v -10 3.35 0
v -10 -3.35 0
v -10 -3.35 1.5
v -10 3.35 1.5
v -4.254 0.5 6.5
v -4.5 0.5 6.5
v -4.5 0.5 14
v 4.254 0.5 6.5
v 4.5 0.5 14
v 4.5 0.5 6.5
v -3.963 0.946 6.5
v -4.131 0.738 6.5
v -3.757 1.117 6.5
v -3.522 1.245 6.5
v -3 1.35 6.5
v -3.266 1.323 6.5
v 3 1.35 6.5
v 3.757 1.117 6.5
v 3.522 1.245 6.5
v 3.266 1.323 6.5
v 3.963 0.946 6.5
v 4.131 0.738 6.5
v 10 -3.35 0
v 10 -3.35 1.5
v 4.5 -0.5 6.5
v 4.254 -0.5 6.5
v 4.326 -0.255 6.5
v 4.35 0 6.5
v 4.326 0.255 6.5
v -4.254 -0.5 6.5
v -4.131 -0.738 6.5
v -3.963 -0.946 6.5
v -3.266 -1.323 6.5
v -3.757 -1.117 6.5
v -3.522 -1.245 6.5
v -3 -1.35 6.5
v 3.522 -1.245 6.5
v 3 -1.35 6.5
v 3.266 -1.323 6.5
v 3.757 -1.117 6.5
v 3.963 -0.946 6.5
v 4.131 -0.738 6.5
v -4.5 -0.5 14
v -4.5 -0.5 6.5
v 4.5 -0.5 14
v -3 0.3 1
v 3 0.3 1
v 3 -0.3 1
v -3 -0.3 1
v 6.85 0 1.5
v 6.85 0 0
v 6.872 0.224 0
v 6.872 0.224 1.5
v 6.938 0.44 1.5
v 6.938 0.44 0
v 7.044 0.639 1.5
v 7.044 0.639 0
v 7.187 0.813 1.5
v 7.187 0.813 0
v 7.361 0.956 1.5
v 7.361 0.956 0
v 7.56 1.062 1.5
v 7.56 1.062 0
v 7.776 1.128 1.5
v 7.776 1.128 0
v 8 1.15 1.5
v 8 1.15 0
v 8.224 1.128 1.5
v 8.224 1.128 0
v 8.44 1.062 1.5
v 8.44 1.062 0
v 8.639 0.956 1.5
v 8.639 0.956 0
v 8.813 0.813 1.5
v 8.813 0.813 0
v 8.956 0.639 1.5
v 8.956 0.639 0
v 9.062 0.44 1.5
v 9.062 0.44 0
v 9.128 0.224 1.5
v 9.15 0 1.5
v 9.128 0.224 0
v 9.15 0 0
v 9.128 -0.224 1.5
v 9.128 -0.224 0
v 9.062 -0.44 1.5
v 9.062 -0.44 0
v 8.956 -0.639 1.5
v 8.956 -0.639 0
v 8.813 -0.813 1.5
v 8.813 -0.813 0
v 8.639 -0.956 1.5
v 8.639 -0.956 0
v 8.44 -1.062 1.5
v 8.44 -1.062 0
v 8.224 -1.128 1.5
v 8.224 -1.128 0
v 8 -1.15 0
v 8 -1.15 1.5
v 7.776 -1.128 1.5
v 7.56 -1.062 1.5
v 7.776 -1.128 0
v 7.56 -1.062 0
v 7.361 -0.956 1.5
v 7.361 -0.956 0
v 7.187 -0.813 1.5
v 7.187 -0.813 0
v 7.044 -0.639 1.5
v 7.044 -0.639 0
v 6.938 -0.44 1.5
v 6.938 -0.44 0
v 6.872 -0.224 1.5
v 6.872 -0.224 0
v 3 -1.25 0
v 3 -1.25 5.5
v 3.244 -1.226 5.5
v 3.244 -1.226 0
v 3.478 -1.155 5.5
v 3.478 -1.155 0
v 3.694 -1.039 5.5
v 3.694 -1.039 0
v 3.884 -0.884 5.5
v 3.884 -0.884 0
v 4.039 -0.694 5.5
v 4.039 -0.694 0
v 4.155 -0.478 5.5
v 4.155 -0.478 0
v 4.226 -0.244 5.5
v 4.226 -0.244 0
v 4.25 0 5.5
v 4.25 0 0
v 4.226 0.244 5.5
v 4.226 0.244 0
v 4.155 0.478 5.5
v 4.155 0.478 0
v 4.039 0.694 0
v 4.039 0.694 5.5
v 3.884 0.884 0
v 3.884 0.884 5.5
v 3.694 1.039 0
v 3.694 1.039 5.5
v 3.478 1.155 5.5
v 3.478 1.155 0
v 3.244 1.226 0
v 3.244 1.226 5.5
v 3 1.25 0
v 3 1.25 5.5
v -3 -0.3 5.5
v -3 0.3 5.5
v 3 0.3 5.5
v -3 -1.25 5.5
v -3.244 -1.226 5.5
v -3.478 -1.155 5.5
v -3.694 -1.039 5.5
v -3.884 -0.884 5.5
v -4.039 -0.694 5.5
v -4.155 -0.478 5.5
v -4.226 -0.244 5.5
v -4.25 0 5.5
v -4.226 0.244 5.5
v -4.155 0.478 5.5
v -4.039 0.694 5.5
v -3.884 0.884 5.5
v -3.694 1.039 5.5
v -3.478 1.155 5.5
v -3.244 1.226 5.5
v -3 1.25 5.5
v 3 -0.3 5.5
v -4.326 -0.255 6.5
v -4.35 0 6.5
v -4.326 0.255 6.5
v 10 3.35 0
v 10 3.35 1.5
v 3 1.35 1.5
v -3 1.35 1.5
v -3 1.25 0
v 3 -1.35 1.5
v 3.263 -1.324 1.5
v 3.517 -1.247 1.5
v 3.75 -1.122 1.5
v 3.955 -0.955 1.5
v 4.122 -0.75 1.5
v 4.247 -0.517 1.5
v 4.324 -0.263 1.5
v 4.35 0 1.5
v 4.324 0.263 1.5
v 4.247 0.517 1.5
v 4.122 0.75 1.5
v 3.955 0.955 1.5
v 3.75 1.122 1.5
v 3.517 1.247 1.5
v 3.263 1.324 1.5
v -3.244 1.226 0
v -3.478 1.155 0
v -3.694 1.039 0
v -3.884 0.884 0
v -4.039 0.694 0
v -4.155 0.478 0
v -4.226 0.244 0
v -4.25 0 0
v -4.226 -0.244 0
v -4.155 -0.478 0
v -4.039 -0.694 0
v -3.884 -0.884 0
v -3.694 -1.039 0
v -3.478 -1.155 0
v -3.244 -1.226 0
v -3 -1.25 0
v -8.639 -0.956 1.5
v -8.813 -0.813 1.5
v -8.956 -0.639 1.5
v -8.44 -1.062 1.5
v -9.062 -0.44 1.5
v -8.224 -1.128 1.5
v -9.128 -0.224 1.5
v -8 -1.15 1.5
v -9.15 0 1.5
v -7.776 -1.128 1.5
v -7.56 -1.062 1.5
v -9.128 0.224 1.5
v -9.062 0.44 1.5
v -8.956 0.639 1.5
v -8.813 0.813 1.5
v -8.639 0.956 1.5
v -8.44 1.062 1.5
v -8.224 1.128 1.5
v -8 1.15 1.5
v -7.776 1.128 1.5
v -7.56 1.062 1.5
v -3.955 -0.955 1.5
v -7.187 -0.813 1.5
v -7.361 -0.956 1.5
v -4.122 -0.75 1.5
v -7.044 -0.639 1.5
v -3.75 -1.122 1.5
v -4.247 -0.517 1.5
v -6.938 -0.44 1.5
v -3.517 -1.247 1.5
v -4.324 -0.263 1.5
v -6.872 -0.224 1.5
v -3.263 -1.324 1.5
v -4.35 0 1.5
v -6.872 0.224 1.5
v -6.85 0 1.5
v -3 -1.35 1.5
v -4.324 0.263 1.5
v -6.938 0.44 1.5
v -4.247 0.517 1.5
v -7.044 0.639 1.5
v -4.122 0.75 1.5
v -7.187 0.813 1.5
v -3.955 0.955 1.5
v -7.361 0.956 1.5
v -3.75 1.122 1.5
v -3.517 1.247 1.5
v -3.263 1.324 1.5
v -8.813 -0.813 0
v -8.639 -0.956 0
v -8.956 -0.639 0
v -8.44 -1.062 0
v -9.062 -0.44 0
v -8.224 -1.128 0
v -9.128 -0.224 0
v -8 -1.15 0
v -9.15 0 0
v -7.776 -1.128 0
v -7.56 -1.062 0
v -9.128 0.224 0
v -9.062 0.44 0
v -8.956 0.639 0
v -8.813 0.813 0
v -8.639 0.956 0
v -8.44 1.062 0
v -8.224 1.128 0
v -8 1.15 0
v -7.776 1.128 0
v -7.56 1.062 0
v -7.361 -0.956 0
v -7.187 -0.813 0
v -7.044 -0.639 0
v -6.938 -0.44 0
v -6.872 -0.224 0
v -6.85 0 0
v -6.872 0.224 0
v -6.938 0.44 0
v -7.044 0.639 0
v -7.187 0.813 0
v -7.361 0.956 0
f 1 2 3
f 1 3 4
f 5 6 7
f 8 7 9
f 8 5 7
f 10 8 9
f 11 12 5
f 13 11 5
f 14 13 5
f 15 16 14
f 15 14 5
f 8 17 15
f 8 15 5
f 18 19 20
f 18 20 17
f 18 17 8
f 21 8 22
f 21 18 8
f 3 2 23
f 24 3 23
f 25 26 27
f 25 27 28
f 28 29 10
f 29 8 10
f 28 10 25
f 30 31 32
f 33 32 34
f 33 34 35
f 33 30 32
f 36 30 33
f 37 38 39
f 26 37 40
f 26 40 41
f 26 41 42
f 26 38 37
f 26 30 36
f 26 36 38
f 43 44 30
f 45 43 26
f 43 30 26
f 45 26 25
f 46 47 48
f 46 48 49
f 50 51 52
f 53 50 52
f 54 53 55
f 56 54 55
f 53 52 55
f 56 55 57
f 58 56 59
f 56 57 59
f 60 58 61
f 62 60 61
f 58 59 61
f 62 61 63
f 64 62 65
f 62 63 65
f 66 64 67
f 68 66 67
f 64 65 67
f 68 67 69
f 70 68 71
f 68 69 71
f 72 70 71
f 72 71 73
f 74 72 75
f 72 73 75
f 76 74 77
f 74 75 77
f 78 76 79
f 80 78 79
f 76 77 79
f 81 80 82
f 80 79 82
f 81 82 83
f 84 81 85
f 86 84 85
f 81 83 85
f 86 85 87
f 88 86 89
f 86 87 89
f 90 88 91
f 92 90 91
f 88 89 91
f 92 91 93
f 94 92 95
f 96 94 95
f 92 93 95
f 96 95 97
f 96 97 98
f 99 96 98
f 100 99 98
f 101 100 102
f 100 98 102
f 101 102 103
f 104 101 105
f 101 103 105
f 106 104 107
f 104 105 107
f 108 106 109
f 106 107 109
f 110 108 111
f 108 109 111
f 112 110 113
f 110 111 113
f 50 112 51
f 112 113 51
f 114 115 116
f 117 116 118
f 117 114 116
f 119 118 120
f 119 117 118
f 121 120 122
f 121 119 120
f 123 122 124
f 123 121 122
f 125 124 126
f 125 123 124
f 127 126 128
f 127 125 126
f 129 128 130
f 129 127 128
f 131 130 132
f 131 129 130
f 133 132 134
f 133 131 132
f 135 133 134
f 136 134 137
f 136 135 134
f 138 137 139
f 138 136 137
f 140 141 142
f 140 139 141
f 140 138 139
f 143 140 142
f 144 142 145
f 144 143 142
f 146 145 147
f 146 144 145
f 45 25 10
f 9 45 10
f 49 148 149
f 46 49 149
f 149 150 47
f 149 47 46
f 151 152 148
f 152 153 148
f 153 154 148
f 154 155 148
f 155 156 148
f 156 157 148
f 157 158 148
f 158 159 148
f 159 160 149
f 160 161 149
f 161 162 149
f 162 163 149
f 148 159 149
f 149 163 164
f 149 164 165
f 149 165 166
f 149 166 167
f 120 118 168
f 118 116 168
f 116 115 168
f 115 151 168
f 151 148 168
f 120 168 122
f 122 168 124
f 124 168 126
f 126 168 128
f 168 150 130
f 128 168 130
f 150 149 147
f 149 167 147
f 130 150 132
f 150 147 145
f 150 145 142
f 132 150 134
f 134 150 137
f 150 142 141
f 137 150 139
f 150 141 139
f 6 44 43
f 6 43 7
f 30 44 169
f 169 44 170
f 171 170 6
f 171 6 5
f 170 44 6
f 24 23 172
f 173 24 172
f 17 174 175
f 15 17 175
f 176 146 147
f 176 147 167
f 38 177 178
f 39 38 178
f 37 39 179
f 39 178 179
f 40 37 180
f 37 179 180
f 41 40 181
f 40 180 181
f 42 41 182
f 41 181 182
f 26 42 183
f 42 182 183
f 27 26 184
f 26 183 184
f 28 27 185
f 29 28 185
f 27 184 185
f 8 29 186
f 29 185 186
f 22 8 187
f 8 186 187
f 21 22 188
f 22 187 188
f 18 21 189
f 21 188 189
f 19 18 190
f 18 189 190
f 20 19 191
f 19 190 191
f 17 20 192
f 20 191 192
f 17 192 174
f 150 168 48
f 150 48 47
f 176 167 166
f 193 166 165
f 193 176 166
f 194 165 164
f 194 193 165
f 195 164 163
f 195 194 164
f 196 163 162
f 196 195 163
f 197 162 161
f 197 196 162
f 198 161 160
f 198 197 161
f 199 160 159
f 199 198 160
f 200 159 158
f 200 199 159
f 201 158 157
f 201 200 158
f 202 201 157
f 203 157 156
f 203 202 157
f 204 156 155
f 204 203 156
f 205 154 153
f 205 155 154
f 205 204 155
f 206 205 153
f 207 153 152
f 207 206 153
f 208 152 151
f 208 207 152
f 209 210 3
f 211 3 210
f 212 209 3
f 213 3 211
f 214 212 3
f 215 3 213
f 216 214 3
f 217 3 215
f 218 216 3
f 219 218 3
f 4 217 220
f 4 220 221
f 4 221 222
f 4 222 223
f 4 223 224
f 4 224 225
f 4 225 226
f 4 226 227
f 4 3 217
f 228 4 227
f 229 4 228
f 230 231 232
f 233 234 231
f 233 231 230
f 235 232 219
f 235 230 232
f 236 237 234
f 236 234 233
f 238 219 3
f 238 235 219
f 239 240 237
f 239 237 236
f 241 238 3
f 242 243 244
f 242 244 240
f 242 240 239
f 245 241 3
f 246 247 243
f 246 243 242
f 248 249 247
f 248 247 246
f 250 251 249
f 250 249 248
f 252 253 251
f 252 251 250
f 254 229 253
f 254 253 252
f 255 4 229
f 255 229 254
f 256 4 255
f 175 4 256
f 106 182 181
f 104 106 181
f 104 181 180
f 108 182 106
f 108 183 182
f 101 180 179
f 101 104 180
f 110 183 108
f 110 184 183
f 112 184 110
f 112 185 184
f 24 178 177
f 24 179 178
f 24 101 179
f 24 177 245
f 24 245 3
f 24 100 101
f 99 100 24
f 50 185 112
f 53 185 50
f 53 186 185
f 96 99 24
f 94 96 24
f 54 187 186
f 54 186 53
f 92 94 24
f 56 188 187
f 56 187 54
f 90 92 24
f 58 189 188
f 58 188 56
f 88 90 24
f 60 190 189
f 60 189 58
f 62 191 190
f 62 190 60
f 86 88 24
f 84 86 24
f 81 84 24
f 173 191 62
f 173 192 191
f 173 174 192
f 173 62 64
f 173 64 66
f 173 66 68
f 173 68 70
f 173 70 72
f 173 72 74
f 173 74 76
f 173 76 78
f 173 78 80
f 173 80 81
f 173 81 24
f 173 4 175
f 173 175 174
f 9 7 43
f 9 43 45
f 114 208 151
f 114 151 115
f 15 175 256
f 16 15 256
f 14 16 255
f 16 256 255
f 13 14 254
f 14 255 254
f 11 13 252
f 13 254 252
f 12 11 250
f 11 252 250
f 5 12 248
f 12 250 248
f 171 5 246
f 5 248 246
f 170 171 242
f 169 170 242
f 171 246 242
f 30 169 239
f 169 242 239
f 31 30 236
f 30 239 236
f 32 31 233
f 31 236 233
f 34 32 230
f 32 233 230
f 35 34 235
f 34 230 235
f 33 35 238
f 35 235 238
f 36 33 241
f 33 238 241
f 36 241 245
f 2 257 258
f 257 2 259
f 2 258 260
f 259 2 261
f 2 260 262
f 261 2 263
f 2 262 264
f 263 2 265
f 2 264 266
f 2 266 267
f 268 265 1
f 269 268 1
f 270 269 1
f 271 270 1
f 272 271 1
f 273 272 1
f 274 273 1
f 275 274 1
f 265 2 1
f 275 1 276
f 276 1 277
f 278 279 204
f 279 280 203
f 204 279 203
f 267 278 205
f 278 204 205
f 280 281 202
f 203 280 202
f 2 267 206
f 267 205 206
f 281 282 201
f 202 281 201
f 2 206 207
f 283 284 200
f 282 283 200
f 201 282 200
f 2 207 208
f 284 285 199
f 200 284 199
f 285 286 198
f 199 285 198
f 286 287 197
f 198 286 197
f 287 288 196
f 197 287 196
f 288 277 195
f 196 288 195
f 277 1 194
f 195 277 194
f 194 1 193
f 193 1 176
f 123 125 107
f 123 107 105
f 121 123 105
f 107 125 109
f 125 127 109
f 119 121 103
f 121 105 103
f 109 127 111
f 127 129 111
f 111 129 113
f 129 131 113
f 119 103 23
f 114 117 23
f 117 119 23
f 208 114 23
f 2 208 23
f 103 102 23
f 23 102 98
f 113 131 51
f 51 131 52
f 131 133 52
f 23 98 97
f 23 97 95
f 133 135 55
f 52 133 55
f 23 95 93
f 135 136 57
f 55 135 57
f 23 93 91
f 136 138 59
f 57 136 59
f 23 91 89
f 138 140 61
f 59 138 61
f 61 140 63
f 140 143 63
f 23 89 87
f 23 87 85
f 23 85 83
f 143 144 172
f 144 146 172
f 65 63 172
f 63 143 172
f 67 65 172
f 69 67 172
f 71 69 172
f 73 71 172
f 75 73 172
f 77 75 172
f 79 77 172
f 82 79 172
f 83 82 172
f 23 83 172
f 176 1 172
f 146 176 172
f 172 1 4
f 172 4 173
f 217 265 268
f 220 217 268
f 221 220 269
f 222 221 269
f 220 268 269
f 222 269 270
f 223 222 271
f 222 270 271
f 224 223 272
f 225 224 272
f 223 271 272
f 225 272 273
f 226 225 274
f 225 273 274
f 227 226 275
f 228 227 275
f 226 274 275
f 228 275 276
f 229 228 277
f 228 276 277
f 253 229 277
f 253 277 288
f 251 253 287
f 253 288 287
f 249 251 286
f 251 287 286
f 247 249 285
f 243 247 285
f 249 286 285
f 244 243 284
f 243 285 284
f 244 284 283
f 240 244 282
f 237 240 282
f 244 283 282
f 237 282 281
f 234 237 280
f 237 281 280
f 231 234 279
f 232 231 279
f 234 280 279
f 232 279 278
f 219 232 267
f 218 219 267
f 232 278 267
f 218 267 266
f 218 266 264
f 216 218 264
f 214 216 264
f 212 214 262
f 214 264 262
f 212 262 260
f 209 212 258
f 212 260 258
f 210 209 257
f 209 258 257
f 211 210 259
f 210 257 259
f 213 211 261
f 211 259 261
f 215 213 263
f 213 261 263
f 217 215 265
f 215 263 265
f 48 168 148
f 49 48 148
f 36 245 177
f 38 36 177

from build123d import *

# Parameters (mm, degrees)
SKETCH1_W           = 20
SKETCH1_H           = 6.7
BOSS_EXTRUDE1_DEPTH = 1.5
SKETCH2_R           = 1.15
CUT_EXTRUDE1_DEPTH  = 1.5
BOSS_EXTRUDE2_DEPTH = 5
BOSS_EXTRUDE3_START = -1
BOSS_EXTRUDE3_DEPTH = 1
SKETCH5_W           = 6
SKETCH5_H           = 0.6
BOSS_EXTRUDE4_DEPTH = 4.5
SKETCH6_W           = 9
SKETCH6_H           = 1
BOSS_EXTRUDE5_DEPTH = 7.5


with BuildPart() as part:
    # Sketch1 → Boss-Extrude1 (new body)
    with BuildSketch(Plane.XY):
        Rectangle(SKETCH1_W, SKETCH1_H)
    extrude(amount=BOSS_EXTRUDE1_DEPTH)

    # Sketch2 → Cut-Extrude1 (cut)
    with BuildSketch(Plane(origin=(0, 0, 0), x_dir=(-1, 0, 0), z_dir=(0, 0, -1))):
        with Locations((-8, 0)):
            Circle(SKETCH2_R)
        with Locations((8, 0)):
            Circle(SKETCH2_R)
        with BuildLine():
            Line((-3, 1.25), (3, 1.25))
            ThreePointArc((3, 1.25), (4.25, 0), (3, -1.25))
            Line((3, -1.25), (-3, -1.25))
            ThreePointArc((-3, -1.25), (-4.25, 0), (-3, 1.25))
        make_face()
    extrude(amount=-CUT_EXTRUDE1_DEPTH, mode=Mode.SUBTRACT)

    # Sketch3 → Boss-Extrude2 (add)
    with BuildSketch(Plane.XY.offset(1.5)):
        with BuildLine():
            Line((3, 1.35), (-3, 1.35))
            ThreePointArc((-3, 1.35), (-4.35, 0), (-3, -1.35))
            Line((-3, -1.35), (3, -1.35))
            ThreePointArc((3, -1.35), (4.35, 0), (3, 1.35))
        make_face()
        with BuildLine():
            Line((3, 1.25), (-3, 1.25))
            ThreePointArc((-3, 1.25), (-4.25, 0), (-3, -1.25))
            Line((-3, -1.25), (3, -1.25))
            ThreePointArc((3, -1.25), (4.25, 0), (3, 1.25))
        make_face(mode=Mode.SUBTRACT)
    extrude(amount=BOSS_EXTRUDE2_DEPTH)

    # Sketch4 → Boss-Extrude3 (add)
    with BuildSketch(Plane.XY.offset(6.5).offset(BOSS_EXTRUDE3_START)):
        with BuildLine():
            Line((3, 1.35), (-3, 1.35))
            ThreePointArc((-3, 1.35), (-4.35, 0), (-3, -1.35))
            Line((-3, -1.35), (3, -1.35))
            ThreePointArc((3, -1.35), (4.35, 0), (3, 1.35))
        make_face()
    extrude(amount=BOSS_EXTRUDE3_DEPTH)

    # Sketch5 → Boss-Extrude4 (add)
    with BuildSketch(Plane(origin=(0, 0, 5.5), x_dir=(-1, 0, 0), z_dir=(0, 0, -1))):
        Rectangle(SKETCH5_W, SKETCH5_H)
    extrude(amount=BOSS_EXTRUDE4_DEPTH)

    # Sketch6 → Boss-Extrude5 (add)
    with BuildSketch(Plane.XY.offset(6.5)):
        Rectangle(SKETCH6_W, SKETCH6_H)
    extrude(amount=BOSS_EXTRUDE5_DEPTH)


solid = part.part
